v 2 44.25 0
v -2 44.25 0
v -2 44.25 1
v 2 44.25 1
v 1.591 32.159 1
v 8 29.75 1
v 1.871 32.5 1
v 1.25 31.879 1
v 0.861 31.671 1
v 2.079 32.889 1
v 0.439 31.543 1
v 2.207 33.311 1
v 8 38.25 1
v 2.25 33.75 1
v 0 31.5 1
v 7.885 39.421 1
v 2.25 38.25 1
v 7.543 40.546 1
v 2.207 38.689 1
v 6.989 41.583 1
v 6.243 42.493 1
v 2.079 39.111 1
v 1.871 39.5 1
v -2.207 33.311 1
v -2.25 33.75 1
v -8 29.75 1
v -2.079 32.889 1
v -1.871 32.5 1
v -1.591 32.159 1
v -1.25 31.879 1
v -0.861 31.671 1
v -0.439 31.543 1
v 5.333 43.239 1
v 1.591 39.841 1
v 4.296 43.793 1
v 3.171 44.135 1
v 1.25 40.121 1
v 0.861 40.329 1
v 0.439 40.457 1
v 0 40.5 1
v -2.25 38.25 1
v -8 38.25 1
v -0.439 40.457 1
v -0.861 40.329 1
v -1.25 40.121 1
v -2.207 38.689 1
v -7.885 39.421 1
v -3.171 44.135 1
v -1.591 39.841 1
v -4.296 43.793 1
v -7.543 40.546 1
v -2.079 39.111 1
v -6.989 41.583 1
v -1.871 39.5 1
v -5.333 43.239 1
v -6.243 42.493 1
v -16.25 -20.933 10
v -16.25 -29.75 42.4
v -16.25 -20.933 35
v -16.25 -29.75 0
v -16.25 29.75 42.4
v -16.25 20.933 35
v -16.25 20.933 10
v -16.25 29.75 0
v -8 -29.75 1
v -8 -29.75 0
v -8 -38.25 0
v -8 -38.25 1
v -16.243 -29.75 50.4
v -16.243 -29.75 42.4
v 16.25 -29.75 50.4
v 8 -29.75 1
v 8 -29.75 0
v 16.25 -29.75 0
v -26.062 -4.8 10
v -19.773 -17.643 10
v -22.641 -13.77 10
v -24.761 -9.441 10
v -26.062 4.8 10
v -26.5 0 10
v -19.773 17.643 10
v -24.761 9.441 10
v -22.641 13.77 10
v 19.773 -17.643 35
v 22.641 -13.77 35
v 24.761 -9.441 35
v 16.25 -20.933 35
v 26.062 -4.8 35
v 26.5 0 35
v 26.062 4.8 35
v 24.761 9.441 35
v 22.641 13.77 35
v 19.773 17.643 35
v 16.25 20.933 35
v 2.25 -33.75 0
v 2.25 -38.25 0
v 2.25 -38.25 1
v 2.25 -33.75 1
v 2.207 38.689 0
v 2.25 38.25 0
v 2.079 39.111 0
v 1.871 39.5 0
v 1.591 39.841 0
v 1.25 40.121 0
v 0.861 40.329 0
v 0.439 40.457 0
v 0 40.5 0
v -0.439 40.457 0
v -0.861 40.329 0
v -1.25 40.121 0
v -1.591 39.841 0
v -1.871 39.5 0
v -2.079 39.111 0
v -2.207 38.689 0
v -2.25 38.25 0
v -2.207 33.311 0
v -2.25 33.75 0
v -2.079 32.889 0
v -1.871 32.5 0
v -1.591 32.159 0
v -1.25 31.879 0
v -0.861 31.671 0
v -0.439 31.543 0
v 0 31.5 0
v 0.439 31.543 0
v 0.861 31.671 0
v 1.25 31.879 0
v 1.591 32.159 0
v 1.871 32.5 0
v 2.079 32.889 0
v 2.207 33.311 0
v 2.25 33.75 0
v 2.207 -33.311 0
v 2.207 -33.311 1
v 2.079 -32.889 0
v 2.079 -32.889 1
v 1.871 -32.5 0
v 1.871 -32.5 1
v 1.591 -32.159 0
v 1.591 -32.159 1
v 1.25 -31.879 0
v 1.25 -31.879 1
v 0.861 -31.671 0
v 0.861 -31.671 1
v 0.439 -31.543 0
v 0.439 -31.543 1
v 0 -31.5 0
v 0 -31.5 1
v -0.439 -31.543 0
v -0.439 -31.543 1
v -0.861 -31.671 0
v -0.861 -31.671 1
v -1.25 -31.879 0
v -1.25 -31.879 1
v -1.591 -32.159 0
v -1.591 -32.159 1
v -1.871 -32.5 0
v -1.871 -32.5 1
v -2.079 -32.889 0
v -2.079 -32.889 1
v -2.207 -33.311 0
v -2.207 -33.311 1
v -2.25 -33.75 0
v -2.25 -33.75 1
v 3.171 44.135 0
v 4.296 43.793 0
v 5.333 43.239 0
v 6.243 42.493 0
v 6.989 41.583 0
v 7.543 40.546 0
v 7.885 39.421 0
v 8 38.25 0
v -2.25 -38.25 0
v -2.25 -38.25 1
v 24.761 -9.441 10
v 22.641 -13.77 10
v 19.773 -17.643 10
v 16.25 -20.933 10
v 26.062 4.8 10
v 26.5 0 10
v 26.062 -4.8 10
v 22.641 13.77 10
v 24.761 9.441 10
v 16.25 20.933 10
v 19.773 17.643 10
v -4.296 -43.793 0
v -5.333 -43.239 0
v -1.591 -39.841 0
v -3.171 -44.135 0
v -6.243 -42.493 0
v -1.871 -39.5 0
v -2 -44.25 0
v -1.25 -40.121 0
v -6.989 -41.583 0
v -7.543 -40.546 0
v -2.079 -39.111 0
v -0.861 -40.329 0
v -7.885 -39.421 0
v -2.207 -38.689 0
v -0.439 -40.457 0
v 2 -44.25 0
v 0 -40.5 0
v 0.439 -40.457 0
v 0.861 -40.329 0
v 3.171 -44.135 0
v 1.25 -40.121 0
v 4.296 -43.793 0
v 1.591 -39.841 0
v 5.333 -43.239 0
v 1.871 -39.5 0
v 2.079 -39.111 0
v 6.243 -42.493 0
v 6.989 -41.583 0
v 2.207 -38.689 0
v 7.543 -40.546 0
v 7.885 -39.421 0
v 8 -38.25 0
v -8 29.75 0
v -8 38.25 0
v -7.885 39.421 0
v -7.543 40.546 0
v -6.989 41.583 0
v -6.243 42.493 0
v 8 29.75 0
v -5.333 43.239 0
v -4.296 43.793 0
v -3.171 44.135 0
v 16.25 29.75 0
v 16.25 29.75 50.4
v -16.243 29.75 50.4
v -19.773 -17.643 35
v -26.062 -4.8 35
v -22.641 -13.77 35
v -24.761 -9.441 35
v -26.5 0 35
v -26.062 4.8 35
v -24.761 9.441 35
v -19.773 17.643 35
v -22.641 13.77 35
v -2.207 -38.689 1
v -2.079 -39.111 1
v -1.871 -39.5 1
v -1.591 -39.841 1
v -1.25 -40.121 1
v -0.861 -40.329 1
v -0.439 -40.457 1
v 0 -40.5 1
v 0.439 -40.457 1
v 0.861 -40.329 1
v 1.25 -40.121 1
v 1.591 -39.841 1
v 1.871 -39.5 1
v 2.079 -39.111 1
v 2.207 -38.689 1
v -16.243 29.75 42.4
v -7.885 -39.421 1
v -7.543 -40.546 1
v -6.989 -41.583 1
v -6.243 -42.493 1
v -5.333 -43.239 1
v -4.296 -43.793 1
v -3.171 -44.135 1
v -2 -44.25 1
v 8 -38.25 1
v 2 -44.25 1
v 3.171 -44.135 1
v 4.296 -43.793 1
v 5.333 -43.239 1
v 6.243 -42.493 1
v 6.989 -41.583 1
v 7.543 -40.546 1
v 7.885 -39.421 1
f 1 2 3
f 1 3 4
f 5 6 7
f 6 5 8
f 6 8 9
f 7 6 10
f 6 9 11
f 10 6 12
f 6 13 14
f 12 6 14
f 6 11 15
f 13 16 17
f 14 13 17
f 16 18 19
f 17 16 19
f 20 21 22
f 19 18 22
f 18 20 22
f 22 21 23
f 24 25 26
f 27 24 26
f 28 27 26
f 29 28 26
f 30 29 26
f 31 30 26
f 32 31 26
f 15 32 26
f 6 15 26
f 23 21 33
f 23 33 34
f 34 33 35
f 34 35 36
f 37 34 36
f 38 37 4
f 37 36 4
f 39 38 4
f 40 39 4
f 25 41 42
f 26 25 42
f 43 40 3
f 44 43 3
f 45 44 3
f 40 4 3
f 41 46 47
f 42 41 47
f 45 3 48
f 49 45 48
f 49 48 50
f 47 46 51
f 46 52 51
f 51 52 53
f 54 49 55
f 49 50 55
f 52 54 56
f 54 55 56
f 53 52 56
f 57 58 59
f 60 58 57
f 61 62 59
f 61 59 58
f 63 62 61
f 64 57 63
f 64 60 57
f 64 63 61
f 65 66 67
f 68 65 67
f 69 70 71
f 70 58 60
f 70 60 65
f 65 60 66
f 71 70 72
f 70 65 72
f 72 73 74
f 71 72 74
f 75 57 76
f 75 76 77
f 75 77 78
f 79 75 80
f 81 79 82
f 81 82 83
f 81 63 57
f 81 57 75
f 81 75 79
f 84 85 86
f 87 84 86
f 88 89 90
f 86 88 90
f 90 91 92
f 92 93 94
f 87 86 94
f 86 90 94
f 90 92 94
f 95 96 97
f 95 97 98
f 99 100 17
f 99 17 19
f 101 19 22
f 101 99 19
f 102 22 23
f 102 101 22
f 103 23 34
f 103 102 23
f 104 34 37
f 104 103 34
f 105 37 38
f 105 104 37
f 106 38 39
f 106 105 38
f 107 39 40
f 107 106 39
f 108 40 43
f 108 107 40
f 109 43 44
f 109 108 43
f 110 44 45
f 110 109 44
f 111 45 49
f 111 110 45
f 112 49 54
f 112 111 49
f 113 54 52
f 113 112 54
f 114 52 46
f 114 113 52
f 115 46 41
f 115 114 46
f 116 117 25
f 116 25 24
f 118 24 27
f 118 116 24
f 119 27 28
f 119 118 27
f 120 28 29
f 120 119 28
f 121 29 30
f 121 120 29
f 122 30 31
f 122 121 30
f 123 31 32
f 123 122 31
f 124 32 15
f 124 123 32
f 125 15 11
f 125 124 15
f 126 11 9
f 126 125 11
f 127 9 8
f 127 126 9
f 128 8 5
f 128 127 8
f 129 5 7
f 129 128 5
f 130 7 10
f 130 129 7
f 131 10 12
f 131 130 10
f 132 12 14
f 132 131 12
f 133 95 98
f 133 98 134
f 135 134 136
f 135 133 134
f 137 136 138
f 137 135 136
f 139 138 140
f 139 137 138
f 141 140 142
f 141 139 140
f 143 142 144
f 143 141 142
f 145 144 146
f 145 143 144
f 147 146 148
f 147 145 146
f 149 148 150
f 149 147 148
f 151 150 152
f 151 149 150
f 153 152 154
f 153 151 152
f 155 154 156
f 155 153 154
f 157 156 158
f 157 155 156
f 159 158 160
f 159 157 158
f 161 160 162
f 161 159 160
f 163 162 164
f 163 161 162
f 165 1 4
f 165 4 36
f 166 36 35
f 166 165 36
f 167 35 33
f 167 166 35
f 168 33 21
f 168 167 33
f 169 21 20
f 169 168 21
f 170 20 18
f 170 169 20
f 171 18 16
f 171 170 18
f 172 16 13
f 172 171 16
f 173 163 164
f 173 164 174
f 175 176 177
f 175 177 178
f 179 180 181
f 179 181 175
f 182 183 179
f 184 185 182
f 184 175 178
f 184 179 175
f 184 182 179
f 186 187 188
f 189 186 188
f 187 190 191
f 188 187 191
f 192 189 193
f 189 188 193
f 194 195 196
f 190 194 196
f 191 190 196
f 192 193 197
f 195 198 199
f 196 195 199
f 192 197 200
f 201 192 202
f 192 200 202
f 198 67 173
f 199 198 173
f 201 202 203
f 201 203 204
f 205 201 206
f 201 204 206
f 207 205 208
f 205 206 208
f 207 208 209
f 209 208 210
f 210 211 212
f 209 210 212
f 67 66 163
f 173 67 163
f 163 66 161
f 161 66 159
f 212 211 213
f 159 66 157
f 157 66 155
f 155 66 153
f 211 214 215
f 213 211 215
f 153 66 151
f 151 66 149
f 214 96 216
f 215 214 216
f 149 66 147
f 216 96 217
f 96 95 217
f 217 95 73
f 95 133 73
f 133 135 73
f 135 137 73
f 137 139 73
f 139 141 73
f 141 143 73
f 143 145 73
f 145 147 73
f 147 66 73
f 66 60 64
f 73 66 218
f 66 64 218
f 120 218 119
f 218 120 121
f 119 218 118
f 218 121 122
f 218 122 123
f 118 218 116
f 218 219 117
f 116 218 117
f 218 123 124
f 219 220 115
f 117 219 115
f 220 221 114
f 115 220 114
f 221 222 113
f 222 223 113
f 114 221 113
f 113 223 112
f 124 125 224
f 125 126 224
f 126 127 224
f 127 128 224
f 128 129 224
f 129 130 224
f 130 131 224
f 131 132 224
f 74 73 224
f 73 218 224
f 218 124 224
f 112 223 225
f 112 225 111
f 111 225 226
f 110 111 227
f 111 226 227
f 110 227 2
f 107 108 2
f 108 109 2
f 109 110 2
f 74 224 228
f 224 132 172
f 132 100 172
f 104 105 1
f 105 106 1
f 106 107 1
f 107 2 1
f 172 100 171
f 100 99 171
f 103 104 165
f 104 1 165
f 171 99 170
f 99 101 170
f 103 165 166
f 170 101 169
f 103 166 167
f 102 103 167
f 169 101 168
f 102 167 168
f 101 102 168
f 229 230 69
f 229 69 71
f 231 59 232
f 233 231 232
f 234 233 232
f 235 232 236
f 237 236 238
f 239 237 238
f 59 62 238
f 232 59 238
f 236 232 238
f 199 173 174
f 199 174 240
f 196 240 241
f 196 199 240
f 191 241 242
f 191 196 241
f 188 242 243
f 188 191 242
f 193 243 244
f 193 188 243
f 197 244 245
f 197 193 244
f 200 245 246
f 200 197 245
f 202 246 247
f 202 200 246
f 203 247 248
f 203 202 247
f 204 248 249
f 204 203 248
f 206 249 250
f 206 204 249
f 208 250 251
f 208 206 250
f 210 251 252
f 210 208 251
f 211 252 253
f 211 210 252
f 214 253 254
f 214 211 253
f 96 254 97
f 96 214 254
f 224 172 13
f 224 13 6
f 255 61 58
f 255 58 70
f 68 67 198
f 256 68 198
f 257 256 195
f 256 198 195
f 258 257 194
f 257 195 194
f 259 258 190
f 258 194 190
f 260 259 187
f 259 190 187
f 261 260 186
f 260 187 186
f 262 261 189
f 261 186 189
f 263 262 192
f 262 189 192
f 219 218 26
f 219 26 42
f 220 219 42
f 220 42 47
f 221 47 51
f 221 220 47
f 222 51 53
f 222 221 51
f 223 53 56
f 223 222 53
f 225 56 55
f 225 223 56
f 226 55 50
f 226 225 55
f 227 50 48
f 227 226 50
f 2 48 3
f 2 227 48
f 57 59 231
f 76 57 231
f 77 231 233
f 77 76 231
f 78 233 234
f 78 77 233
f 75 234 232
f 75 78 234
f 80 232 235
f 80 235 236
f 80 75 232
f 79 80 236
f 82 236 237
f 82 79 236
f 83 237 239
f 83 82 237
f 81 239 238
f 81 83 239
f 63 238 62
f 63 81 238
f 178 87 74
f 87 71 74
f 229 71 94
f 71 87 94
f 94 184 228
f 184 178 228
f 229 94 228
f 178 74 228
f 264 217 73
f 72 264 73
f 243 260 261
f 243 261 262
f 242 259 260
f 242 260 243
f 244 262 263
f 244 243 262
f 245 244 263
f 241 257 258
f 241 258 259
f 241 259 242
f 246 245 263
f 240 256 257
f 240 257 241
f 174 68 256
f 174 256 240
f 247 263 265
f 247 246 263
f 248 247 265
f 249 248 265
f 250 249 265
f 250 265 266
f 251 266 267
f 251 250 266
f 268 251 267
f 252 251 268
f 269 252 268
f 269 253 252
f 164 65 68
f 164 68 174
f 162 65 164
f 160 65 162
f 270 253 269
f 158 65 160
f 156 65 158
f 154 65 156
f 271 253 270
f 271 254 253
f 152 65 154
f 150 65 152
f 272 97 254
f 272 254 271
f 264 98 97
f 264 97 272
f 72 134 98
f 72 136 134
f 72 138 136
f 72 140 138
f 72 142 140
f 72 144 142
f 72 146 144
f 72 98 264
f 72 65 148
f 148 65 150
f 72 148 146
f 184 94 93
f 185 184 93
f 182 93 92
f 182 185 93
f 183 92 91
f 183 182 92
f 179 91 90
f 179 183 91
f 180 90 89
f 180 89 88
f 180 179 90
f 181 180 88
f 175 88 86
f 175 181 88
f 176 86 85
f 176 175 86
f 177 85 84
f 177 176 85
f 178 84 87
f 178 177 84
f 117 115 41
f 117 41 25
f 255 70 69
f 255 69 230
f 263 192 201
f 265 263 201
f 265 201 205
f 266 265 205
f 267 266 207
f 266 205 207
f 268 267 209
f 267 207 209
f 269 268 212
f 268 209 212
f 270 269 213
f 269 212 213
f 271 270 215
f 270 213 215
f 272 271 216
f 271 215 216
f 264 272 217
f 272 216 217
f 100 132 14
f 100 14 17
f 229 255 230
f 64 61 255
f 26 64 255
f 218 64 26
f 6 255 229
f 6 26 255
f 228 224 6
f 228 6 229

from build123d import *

# Parameters (mm, degrees)
SKETCH_1_W      = 32.5
SKETCH_1_H      = 59.5
EXTRUDE_1_DEPTH = 42.4
EXTRUDE_2_DEPTH = 25
EXTRUDE_3_DEPTH = 1
SKETCH_5_W      = 32.493243018
SKETCH_5_H      = 59.5
EXTRUDE_5_DEPTH = 8


with BuildPart() as part:
    # 草图1 → 拉伸1 (new body)
    with BuildSketch(Plane.XY):
        Rectangle(SKETCH_1_W, SKETCH_1_H)
    extrude(amount=EXTRUDE_1_DEPTH)

    # 草图2 → 拉伸2 (add)
    with BuildSketch(Plane.XY.offset(10)):
        with BuildLine():
            Line((-16.25, 20.932928605), (16.25, 20.932928605))
            ThreePointArc((16.25, 20.932928605), (26.5, 0), (16.25, -20.932928605))
            Line((16.25, -20.932928605), (-16.25, -20.932928605))
            ThreePointArc((-16.25, -20.932928605), (-26.5, 0), (-16.25, 20.932928605))
        make_face()
    extrude(amount=EXTRUDE_2_DEPTH)

    # 草图4 → 拉伸3 (add)
    # profile 1 of 2: a face of its own
    with BuildSketch(Plane.XY):
        with BuildLine():
            Line((-2, 44.25), (2, 44.25))
            ThreePointArc((2, 44.25), (6.242640687, 42.492640687), (8, 38.25))
            Line((8, 38.25), (8, 29.75))
            Line((8, 29.75), (-8, 29.75))
            Line((-8, 29.75), (-8, 38.25))
            ThreePointArc((-8, 38.25), (-6.242640687, 42.492640687), (-2, 44.25))
        make_face()
        with BuildLine():
            Line((-2.25, 38.25), (-2.25, 33.75))
            ThreePointArc((-2.25, 33.75), (0, 31.5), (2.25, 33.75))
            Line((2.25, 33.75), (2.25, 38.25))
            ThreePointArc((2.25, 38.25), (0, 40.5), (-2.25, 38.25))
        make_face(mode=Mode.SUBTRACT)
    # profile 2 of 2: a face of its own
    with BuildSketch(Plane.XY):
        with BuildLine():
            Line((-2, -44.25), (2, -44.25))
            ThreePointArc((2, -44.25), (6.242640687, -42.492640687), (8, -38.25))
            Line((8, -38.25), (8, -29.75))
            Line((8, -29.75), (-8, -29.75))
            Line((-8, -29.75), (-8, -38.25))
            ThreePointArc((-8, -38.25), (-6.242640687, -42.492640687), (-2, -44.25))
        make_face()
        with BuildLine():
            Line((2.25, -38.25), (2.25, -33.75))
            ThreePointArc((2.25, -33.75), (0, -31.5), (-2.25, -33.75))
            Line((-2.25, -33.75), (-2.25, -38.25))
            ThreePointArc((-2.25, -38.25), (0, -40.5), (2.25, -38.25))
        make_face(mode=Mode.SUBTRACT)
    extrude(amount=EXTRUDE_3_DEPTH)

    # 草图5 → 拉伸5 (add)
    with BuildSketch(Plane.XY.offset(42.4)):
        with Locations((0.003378491, 0)):
            Rectangle(SKETCH_5_W, SKETCH_5_H)
    extrude(amount=EXTRUDE_5_DEPTH)


solid = part.part
